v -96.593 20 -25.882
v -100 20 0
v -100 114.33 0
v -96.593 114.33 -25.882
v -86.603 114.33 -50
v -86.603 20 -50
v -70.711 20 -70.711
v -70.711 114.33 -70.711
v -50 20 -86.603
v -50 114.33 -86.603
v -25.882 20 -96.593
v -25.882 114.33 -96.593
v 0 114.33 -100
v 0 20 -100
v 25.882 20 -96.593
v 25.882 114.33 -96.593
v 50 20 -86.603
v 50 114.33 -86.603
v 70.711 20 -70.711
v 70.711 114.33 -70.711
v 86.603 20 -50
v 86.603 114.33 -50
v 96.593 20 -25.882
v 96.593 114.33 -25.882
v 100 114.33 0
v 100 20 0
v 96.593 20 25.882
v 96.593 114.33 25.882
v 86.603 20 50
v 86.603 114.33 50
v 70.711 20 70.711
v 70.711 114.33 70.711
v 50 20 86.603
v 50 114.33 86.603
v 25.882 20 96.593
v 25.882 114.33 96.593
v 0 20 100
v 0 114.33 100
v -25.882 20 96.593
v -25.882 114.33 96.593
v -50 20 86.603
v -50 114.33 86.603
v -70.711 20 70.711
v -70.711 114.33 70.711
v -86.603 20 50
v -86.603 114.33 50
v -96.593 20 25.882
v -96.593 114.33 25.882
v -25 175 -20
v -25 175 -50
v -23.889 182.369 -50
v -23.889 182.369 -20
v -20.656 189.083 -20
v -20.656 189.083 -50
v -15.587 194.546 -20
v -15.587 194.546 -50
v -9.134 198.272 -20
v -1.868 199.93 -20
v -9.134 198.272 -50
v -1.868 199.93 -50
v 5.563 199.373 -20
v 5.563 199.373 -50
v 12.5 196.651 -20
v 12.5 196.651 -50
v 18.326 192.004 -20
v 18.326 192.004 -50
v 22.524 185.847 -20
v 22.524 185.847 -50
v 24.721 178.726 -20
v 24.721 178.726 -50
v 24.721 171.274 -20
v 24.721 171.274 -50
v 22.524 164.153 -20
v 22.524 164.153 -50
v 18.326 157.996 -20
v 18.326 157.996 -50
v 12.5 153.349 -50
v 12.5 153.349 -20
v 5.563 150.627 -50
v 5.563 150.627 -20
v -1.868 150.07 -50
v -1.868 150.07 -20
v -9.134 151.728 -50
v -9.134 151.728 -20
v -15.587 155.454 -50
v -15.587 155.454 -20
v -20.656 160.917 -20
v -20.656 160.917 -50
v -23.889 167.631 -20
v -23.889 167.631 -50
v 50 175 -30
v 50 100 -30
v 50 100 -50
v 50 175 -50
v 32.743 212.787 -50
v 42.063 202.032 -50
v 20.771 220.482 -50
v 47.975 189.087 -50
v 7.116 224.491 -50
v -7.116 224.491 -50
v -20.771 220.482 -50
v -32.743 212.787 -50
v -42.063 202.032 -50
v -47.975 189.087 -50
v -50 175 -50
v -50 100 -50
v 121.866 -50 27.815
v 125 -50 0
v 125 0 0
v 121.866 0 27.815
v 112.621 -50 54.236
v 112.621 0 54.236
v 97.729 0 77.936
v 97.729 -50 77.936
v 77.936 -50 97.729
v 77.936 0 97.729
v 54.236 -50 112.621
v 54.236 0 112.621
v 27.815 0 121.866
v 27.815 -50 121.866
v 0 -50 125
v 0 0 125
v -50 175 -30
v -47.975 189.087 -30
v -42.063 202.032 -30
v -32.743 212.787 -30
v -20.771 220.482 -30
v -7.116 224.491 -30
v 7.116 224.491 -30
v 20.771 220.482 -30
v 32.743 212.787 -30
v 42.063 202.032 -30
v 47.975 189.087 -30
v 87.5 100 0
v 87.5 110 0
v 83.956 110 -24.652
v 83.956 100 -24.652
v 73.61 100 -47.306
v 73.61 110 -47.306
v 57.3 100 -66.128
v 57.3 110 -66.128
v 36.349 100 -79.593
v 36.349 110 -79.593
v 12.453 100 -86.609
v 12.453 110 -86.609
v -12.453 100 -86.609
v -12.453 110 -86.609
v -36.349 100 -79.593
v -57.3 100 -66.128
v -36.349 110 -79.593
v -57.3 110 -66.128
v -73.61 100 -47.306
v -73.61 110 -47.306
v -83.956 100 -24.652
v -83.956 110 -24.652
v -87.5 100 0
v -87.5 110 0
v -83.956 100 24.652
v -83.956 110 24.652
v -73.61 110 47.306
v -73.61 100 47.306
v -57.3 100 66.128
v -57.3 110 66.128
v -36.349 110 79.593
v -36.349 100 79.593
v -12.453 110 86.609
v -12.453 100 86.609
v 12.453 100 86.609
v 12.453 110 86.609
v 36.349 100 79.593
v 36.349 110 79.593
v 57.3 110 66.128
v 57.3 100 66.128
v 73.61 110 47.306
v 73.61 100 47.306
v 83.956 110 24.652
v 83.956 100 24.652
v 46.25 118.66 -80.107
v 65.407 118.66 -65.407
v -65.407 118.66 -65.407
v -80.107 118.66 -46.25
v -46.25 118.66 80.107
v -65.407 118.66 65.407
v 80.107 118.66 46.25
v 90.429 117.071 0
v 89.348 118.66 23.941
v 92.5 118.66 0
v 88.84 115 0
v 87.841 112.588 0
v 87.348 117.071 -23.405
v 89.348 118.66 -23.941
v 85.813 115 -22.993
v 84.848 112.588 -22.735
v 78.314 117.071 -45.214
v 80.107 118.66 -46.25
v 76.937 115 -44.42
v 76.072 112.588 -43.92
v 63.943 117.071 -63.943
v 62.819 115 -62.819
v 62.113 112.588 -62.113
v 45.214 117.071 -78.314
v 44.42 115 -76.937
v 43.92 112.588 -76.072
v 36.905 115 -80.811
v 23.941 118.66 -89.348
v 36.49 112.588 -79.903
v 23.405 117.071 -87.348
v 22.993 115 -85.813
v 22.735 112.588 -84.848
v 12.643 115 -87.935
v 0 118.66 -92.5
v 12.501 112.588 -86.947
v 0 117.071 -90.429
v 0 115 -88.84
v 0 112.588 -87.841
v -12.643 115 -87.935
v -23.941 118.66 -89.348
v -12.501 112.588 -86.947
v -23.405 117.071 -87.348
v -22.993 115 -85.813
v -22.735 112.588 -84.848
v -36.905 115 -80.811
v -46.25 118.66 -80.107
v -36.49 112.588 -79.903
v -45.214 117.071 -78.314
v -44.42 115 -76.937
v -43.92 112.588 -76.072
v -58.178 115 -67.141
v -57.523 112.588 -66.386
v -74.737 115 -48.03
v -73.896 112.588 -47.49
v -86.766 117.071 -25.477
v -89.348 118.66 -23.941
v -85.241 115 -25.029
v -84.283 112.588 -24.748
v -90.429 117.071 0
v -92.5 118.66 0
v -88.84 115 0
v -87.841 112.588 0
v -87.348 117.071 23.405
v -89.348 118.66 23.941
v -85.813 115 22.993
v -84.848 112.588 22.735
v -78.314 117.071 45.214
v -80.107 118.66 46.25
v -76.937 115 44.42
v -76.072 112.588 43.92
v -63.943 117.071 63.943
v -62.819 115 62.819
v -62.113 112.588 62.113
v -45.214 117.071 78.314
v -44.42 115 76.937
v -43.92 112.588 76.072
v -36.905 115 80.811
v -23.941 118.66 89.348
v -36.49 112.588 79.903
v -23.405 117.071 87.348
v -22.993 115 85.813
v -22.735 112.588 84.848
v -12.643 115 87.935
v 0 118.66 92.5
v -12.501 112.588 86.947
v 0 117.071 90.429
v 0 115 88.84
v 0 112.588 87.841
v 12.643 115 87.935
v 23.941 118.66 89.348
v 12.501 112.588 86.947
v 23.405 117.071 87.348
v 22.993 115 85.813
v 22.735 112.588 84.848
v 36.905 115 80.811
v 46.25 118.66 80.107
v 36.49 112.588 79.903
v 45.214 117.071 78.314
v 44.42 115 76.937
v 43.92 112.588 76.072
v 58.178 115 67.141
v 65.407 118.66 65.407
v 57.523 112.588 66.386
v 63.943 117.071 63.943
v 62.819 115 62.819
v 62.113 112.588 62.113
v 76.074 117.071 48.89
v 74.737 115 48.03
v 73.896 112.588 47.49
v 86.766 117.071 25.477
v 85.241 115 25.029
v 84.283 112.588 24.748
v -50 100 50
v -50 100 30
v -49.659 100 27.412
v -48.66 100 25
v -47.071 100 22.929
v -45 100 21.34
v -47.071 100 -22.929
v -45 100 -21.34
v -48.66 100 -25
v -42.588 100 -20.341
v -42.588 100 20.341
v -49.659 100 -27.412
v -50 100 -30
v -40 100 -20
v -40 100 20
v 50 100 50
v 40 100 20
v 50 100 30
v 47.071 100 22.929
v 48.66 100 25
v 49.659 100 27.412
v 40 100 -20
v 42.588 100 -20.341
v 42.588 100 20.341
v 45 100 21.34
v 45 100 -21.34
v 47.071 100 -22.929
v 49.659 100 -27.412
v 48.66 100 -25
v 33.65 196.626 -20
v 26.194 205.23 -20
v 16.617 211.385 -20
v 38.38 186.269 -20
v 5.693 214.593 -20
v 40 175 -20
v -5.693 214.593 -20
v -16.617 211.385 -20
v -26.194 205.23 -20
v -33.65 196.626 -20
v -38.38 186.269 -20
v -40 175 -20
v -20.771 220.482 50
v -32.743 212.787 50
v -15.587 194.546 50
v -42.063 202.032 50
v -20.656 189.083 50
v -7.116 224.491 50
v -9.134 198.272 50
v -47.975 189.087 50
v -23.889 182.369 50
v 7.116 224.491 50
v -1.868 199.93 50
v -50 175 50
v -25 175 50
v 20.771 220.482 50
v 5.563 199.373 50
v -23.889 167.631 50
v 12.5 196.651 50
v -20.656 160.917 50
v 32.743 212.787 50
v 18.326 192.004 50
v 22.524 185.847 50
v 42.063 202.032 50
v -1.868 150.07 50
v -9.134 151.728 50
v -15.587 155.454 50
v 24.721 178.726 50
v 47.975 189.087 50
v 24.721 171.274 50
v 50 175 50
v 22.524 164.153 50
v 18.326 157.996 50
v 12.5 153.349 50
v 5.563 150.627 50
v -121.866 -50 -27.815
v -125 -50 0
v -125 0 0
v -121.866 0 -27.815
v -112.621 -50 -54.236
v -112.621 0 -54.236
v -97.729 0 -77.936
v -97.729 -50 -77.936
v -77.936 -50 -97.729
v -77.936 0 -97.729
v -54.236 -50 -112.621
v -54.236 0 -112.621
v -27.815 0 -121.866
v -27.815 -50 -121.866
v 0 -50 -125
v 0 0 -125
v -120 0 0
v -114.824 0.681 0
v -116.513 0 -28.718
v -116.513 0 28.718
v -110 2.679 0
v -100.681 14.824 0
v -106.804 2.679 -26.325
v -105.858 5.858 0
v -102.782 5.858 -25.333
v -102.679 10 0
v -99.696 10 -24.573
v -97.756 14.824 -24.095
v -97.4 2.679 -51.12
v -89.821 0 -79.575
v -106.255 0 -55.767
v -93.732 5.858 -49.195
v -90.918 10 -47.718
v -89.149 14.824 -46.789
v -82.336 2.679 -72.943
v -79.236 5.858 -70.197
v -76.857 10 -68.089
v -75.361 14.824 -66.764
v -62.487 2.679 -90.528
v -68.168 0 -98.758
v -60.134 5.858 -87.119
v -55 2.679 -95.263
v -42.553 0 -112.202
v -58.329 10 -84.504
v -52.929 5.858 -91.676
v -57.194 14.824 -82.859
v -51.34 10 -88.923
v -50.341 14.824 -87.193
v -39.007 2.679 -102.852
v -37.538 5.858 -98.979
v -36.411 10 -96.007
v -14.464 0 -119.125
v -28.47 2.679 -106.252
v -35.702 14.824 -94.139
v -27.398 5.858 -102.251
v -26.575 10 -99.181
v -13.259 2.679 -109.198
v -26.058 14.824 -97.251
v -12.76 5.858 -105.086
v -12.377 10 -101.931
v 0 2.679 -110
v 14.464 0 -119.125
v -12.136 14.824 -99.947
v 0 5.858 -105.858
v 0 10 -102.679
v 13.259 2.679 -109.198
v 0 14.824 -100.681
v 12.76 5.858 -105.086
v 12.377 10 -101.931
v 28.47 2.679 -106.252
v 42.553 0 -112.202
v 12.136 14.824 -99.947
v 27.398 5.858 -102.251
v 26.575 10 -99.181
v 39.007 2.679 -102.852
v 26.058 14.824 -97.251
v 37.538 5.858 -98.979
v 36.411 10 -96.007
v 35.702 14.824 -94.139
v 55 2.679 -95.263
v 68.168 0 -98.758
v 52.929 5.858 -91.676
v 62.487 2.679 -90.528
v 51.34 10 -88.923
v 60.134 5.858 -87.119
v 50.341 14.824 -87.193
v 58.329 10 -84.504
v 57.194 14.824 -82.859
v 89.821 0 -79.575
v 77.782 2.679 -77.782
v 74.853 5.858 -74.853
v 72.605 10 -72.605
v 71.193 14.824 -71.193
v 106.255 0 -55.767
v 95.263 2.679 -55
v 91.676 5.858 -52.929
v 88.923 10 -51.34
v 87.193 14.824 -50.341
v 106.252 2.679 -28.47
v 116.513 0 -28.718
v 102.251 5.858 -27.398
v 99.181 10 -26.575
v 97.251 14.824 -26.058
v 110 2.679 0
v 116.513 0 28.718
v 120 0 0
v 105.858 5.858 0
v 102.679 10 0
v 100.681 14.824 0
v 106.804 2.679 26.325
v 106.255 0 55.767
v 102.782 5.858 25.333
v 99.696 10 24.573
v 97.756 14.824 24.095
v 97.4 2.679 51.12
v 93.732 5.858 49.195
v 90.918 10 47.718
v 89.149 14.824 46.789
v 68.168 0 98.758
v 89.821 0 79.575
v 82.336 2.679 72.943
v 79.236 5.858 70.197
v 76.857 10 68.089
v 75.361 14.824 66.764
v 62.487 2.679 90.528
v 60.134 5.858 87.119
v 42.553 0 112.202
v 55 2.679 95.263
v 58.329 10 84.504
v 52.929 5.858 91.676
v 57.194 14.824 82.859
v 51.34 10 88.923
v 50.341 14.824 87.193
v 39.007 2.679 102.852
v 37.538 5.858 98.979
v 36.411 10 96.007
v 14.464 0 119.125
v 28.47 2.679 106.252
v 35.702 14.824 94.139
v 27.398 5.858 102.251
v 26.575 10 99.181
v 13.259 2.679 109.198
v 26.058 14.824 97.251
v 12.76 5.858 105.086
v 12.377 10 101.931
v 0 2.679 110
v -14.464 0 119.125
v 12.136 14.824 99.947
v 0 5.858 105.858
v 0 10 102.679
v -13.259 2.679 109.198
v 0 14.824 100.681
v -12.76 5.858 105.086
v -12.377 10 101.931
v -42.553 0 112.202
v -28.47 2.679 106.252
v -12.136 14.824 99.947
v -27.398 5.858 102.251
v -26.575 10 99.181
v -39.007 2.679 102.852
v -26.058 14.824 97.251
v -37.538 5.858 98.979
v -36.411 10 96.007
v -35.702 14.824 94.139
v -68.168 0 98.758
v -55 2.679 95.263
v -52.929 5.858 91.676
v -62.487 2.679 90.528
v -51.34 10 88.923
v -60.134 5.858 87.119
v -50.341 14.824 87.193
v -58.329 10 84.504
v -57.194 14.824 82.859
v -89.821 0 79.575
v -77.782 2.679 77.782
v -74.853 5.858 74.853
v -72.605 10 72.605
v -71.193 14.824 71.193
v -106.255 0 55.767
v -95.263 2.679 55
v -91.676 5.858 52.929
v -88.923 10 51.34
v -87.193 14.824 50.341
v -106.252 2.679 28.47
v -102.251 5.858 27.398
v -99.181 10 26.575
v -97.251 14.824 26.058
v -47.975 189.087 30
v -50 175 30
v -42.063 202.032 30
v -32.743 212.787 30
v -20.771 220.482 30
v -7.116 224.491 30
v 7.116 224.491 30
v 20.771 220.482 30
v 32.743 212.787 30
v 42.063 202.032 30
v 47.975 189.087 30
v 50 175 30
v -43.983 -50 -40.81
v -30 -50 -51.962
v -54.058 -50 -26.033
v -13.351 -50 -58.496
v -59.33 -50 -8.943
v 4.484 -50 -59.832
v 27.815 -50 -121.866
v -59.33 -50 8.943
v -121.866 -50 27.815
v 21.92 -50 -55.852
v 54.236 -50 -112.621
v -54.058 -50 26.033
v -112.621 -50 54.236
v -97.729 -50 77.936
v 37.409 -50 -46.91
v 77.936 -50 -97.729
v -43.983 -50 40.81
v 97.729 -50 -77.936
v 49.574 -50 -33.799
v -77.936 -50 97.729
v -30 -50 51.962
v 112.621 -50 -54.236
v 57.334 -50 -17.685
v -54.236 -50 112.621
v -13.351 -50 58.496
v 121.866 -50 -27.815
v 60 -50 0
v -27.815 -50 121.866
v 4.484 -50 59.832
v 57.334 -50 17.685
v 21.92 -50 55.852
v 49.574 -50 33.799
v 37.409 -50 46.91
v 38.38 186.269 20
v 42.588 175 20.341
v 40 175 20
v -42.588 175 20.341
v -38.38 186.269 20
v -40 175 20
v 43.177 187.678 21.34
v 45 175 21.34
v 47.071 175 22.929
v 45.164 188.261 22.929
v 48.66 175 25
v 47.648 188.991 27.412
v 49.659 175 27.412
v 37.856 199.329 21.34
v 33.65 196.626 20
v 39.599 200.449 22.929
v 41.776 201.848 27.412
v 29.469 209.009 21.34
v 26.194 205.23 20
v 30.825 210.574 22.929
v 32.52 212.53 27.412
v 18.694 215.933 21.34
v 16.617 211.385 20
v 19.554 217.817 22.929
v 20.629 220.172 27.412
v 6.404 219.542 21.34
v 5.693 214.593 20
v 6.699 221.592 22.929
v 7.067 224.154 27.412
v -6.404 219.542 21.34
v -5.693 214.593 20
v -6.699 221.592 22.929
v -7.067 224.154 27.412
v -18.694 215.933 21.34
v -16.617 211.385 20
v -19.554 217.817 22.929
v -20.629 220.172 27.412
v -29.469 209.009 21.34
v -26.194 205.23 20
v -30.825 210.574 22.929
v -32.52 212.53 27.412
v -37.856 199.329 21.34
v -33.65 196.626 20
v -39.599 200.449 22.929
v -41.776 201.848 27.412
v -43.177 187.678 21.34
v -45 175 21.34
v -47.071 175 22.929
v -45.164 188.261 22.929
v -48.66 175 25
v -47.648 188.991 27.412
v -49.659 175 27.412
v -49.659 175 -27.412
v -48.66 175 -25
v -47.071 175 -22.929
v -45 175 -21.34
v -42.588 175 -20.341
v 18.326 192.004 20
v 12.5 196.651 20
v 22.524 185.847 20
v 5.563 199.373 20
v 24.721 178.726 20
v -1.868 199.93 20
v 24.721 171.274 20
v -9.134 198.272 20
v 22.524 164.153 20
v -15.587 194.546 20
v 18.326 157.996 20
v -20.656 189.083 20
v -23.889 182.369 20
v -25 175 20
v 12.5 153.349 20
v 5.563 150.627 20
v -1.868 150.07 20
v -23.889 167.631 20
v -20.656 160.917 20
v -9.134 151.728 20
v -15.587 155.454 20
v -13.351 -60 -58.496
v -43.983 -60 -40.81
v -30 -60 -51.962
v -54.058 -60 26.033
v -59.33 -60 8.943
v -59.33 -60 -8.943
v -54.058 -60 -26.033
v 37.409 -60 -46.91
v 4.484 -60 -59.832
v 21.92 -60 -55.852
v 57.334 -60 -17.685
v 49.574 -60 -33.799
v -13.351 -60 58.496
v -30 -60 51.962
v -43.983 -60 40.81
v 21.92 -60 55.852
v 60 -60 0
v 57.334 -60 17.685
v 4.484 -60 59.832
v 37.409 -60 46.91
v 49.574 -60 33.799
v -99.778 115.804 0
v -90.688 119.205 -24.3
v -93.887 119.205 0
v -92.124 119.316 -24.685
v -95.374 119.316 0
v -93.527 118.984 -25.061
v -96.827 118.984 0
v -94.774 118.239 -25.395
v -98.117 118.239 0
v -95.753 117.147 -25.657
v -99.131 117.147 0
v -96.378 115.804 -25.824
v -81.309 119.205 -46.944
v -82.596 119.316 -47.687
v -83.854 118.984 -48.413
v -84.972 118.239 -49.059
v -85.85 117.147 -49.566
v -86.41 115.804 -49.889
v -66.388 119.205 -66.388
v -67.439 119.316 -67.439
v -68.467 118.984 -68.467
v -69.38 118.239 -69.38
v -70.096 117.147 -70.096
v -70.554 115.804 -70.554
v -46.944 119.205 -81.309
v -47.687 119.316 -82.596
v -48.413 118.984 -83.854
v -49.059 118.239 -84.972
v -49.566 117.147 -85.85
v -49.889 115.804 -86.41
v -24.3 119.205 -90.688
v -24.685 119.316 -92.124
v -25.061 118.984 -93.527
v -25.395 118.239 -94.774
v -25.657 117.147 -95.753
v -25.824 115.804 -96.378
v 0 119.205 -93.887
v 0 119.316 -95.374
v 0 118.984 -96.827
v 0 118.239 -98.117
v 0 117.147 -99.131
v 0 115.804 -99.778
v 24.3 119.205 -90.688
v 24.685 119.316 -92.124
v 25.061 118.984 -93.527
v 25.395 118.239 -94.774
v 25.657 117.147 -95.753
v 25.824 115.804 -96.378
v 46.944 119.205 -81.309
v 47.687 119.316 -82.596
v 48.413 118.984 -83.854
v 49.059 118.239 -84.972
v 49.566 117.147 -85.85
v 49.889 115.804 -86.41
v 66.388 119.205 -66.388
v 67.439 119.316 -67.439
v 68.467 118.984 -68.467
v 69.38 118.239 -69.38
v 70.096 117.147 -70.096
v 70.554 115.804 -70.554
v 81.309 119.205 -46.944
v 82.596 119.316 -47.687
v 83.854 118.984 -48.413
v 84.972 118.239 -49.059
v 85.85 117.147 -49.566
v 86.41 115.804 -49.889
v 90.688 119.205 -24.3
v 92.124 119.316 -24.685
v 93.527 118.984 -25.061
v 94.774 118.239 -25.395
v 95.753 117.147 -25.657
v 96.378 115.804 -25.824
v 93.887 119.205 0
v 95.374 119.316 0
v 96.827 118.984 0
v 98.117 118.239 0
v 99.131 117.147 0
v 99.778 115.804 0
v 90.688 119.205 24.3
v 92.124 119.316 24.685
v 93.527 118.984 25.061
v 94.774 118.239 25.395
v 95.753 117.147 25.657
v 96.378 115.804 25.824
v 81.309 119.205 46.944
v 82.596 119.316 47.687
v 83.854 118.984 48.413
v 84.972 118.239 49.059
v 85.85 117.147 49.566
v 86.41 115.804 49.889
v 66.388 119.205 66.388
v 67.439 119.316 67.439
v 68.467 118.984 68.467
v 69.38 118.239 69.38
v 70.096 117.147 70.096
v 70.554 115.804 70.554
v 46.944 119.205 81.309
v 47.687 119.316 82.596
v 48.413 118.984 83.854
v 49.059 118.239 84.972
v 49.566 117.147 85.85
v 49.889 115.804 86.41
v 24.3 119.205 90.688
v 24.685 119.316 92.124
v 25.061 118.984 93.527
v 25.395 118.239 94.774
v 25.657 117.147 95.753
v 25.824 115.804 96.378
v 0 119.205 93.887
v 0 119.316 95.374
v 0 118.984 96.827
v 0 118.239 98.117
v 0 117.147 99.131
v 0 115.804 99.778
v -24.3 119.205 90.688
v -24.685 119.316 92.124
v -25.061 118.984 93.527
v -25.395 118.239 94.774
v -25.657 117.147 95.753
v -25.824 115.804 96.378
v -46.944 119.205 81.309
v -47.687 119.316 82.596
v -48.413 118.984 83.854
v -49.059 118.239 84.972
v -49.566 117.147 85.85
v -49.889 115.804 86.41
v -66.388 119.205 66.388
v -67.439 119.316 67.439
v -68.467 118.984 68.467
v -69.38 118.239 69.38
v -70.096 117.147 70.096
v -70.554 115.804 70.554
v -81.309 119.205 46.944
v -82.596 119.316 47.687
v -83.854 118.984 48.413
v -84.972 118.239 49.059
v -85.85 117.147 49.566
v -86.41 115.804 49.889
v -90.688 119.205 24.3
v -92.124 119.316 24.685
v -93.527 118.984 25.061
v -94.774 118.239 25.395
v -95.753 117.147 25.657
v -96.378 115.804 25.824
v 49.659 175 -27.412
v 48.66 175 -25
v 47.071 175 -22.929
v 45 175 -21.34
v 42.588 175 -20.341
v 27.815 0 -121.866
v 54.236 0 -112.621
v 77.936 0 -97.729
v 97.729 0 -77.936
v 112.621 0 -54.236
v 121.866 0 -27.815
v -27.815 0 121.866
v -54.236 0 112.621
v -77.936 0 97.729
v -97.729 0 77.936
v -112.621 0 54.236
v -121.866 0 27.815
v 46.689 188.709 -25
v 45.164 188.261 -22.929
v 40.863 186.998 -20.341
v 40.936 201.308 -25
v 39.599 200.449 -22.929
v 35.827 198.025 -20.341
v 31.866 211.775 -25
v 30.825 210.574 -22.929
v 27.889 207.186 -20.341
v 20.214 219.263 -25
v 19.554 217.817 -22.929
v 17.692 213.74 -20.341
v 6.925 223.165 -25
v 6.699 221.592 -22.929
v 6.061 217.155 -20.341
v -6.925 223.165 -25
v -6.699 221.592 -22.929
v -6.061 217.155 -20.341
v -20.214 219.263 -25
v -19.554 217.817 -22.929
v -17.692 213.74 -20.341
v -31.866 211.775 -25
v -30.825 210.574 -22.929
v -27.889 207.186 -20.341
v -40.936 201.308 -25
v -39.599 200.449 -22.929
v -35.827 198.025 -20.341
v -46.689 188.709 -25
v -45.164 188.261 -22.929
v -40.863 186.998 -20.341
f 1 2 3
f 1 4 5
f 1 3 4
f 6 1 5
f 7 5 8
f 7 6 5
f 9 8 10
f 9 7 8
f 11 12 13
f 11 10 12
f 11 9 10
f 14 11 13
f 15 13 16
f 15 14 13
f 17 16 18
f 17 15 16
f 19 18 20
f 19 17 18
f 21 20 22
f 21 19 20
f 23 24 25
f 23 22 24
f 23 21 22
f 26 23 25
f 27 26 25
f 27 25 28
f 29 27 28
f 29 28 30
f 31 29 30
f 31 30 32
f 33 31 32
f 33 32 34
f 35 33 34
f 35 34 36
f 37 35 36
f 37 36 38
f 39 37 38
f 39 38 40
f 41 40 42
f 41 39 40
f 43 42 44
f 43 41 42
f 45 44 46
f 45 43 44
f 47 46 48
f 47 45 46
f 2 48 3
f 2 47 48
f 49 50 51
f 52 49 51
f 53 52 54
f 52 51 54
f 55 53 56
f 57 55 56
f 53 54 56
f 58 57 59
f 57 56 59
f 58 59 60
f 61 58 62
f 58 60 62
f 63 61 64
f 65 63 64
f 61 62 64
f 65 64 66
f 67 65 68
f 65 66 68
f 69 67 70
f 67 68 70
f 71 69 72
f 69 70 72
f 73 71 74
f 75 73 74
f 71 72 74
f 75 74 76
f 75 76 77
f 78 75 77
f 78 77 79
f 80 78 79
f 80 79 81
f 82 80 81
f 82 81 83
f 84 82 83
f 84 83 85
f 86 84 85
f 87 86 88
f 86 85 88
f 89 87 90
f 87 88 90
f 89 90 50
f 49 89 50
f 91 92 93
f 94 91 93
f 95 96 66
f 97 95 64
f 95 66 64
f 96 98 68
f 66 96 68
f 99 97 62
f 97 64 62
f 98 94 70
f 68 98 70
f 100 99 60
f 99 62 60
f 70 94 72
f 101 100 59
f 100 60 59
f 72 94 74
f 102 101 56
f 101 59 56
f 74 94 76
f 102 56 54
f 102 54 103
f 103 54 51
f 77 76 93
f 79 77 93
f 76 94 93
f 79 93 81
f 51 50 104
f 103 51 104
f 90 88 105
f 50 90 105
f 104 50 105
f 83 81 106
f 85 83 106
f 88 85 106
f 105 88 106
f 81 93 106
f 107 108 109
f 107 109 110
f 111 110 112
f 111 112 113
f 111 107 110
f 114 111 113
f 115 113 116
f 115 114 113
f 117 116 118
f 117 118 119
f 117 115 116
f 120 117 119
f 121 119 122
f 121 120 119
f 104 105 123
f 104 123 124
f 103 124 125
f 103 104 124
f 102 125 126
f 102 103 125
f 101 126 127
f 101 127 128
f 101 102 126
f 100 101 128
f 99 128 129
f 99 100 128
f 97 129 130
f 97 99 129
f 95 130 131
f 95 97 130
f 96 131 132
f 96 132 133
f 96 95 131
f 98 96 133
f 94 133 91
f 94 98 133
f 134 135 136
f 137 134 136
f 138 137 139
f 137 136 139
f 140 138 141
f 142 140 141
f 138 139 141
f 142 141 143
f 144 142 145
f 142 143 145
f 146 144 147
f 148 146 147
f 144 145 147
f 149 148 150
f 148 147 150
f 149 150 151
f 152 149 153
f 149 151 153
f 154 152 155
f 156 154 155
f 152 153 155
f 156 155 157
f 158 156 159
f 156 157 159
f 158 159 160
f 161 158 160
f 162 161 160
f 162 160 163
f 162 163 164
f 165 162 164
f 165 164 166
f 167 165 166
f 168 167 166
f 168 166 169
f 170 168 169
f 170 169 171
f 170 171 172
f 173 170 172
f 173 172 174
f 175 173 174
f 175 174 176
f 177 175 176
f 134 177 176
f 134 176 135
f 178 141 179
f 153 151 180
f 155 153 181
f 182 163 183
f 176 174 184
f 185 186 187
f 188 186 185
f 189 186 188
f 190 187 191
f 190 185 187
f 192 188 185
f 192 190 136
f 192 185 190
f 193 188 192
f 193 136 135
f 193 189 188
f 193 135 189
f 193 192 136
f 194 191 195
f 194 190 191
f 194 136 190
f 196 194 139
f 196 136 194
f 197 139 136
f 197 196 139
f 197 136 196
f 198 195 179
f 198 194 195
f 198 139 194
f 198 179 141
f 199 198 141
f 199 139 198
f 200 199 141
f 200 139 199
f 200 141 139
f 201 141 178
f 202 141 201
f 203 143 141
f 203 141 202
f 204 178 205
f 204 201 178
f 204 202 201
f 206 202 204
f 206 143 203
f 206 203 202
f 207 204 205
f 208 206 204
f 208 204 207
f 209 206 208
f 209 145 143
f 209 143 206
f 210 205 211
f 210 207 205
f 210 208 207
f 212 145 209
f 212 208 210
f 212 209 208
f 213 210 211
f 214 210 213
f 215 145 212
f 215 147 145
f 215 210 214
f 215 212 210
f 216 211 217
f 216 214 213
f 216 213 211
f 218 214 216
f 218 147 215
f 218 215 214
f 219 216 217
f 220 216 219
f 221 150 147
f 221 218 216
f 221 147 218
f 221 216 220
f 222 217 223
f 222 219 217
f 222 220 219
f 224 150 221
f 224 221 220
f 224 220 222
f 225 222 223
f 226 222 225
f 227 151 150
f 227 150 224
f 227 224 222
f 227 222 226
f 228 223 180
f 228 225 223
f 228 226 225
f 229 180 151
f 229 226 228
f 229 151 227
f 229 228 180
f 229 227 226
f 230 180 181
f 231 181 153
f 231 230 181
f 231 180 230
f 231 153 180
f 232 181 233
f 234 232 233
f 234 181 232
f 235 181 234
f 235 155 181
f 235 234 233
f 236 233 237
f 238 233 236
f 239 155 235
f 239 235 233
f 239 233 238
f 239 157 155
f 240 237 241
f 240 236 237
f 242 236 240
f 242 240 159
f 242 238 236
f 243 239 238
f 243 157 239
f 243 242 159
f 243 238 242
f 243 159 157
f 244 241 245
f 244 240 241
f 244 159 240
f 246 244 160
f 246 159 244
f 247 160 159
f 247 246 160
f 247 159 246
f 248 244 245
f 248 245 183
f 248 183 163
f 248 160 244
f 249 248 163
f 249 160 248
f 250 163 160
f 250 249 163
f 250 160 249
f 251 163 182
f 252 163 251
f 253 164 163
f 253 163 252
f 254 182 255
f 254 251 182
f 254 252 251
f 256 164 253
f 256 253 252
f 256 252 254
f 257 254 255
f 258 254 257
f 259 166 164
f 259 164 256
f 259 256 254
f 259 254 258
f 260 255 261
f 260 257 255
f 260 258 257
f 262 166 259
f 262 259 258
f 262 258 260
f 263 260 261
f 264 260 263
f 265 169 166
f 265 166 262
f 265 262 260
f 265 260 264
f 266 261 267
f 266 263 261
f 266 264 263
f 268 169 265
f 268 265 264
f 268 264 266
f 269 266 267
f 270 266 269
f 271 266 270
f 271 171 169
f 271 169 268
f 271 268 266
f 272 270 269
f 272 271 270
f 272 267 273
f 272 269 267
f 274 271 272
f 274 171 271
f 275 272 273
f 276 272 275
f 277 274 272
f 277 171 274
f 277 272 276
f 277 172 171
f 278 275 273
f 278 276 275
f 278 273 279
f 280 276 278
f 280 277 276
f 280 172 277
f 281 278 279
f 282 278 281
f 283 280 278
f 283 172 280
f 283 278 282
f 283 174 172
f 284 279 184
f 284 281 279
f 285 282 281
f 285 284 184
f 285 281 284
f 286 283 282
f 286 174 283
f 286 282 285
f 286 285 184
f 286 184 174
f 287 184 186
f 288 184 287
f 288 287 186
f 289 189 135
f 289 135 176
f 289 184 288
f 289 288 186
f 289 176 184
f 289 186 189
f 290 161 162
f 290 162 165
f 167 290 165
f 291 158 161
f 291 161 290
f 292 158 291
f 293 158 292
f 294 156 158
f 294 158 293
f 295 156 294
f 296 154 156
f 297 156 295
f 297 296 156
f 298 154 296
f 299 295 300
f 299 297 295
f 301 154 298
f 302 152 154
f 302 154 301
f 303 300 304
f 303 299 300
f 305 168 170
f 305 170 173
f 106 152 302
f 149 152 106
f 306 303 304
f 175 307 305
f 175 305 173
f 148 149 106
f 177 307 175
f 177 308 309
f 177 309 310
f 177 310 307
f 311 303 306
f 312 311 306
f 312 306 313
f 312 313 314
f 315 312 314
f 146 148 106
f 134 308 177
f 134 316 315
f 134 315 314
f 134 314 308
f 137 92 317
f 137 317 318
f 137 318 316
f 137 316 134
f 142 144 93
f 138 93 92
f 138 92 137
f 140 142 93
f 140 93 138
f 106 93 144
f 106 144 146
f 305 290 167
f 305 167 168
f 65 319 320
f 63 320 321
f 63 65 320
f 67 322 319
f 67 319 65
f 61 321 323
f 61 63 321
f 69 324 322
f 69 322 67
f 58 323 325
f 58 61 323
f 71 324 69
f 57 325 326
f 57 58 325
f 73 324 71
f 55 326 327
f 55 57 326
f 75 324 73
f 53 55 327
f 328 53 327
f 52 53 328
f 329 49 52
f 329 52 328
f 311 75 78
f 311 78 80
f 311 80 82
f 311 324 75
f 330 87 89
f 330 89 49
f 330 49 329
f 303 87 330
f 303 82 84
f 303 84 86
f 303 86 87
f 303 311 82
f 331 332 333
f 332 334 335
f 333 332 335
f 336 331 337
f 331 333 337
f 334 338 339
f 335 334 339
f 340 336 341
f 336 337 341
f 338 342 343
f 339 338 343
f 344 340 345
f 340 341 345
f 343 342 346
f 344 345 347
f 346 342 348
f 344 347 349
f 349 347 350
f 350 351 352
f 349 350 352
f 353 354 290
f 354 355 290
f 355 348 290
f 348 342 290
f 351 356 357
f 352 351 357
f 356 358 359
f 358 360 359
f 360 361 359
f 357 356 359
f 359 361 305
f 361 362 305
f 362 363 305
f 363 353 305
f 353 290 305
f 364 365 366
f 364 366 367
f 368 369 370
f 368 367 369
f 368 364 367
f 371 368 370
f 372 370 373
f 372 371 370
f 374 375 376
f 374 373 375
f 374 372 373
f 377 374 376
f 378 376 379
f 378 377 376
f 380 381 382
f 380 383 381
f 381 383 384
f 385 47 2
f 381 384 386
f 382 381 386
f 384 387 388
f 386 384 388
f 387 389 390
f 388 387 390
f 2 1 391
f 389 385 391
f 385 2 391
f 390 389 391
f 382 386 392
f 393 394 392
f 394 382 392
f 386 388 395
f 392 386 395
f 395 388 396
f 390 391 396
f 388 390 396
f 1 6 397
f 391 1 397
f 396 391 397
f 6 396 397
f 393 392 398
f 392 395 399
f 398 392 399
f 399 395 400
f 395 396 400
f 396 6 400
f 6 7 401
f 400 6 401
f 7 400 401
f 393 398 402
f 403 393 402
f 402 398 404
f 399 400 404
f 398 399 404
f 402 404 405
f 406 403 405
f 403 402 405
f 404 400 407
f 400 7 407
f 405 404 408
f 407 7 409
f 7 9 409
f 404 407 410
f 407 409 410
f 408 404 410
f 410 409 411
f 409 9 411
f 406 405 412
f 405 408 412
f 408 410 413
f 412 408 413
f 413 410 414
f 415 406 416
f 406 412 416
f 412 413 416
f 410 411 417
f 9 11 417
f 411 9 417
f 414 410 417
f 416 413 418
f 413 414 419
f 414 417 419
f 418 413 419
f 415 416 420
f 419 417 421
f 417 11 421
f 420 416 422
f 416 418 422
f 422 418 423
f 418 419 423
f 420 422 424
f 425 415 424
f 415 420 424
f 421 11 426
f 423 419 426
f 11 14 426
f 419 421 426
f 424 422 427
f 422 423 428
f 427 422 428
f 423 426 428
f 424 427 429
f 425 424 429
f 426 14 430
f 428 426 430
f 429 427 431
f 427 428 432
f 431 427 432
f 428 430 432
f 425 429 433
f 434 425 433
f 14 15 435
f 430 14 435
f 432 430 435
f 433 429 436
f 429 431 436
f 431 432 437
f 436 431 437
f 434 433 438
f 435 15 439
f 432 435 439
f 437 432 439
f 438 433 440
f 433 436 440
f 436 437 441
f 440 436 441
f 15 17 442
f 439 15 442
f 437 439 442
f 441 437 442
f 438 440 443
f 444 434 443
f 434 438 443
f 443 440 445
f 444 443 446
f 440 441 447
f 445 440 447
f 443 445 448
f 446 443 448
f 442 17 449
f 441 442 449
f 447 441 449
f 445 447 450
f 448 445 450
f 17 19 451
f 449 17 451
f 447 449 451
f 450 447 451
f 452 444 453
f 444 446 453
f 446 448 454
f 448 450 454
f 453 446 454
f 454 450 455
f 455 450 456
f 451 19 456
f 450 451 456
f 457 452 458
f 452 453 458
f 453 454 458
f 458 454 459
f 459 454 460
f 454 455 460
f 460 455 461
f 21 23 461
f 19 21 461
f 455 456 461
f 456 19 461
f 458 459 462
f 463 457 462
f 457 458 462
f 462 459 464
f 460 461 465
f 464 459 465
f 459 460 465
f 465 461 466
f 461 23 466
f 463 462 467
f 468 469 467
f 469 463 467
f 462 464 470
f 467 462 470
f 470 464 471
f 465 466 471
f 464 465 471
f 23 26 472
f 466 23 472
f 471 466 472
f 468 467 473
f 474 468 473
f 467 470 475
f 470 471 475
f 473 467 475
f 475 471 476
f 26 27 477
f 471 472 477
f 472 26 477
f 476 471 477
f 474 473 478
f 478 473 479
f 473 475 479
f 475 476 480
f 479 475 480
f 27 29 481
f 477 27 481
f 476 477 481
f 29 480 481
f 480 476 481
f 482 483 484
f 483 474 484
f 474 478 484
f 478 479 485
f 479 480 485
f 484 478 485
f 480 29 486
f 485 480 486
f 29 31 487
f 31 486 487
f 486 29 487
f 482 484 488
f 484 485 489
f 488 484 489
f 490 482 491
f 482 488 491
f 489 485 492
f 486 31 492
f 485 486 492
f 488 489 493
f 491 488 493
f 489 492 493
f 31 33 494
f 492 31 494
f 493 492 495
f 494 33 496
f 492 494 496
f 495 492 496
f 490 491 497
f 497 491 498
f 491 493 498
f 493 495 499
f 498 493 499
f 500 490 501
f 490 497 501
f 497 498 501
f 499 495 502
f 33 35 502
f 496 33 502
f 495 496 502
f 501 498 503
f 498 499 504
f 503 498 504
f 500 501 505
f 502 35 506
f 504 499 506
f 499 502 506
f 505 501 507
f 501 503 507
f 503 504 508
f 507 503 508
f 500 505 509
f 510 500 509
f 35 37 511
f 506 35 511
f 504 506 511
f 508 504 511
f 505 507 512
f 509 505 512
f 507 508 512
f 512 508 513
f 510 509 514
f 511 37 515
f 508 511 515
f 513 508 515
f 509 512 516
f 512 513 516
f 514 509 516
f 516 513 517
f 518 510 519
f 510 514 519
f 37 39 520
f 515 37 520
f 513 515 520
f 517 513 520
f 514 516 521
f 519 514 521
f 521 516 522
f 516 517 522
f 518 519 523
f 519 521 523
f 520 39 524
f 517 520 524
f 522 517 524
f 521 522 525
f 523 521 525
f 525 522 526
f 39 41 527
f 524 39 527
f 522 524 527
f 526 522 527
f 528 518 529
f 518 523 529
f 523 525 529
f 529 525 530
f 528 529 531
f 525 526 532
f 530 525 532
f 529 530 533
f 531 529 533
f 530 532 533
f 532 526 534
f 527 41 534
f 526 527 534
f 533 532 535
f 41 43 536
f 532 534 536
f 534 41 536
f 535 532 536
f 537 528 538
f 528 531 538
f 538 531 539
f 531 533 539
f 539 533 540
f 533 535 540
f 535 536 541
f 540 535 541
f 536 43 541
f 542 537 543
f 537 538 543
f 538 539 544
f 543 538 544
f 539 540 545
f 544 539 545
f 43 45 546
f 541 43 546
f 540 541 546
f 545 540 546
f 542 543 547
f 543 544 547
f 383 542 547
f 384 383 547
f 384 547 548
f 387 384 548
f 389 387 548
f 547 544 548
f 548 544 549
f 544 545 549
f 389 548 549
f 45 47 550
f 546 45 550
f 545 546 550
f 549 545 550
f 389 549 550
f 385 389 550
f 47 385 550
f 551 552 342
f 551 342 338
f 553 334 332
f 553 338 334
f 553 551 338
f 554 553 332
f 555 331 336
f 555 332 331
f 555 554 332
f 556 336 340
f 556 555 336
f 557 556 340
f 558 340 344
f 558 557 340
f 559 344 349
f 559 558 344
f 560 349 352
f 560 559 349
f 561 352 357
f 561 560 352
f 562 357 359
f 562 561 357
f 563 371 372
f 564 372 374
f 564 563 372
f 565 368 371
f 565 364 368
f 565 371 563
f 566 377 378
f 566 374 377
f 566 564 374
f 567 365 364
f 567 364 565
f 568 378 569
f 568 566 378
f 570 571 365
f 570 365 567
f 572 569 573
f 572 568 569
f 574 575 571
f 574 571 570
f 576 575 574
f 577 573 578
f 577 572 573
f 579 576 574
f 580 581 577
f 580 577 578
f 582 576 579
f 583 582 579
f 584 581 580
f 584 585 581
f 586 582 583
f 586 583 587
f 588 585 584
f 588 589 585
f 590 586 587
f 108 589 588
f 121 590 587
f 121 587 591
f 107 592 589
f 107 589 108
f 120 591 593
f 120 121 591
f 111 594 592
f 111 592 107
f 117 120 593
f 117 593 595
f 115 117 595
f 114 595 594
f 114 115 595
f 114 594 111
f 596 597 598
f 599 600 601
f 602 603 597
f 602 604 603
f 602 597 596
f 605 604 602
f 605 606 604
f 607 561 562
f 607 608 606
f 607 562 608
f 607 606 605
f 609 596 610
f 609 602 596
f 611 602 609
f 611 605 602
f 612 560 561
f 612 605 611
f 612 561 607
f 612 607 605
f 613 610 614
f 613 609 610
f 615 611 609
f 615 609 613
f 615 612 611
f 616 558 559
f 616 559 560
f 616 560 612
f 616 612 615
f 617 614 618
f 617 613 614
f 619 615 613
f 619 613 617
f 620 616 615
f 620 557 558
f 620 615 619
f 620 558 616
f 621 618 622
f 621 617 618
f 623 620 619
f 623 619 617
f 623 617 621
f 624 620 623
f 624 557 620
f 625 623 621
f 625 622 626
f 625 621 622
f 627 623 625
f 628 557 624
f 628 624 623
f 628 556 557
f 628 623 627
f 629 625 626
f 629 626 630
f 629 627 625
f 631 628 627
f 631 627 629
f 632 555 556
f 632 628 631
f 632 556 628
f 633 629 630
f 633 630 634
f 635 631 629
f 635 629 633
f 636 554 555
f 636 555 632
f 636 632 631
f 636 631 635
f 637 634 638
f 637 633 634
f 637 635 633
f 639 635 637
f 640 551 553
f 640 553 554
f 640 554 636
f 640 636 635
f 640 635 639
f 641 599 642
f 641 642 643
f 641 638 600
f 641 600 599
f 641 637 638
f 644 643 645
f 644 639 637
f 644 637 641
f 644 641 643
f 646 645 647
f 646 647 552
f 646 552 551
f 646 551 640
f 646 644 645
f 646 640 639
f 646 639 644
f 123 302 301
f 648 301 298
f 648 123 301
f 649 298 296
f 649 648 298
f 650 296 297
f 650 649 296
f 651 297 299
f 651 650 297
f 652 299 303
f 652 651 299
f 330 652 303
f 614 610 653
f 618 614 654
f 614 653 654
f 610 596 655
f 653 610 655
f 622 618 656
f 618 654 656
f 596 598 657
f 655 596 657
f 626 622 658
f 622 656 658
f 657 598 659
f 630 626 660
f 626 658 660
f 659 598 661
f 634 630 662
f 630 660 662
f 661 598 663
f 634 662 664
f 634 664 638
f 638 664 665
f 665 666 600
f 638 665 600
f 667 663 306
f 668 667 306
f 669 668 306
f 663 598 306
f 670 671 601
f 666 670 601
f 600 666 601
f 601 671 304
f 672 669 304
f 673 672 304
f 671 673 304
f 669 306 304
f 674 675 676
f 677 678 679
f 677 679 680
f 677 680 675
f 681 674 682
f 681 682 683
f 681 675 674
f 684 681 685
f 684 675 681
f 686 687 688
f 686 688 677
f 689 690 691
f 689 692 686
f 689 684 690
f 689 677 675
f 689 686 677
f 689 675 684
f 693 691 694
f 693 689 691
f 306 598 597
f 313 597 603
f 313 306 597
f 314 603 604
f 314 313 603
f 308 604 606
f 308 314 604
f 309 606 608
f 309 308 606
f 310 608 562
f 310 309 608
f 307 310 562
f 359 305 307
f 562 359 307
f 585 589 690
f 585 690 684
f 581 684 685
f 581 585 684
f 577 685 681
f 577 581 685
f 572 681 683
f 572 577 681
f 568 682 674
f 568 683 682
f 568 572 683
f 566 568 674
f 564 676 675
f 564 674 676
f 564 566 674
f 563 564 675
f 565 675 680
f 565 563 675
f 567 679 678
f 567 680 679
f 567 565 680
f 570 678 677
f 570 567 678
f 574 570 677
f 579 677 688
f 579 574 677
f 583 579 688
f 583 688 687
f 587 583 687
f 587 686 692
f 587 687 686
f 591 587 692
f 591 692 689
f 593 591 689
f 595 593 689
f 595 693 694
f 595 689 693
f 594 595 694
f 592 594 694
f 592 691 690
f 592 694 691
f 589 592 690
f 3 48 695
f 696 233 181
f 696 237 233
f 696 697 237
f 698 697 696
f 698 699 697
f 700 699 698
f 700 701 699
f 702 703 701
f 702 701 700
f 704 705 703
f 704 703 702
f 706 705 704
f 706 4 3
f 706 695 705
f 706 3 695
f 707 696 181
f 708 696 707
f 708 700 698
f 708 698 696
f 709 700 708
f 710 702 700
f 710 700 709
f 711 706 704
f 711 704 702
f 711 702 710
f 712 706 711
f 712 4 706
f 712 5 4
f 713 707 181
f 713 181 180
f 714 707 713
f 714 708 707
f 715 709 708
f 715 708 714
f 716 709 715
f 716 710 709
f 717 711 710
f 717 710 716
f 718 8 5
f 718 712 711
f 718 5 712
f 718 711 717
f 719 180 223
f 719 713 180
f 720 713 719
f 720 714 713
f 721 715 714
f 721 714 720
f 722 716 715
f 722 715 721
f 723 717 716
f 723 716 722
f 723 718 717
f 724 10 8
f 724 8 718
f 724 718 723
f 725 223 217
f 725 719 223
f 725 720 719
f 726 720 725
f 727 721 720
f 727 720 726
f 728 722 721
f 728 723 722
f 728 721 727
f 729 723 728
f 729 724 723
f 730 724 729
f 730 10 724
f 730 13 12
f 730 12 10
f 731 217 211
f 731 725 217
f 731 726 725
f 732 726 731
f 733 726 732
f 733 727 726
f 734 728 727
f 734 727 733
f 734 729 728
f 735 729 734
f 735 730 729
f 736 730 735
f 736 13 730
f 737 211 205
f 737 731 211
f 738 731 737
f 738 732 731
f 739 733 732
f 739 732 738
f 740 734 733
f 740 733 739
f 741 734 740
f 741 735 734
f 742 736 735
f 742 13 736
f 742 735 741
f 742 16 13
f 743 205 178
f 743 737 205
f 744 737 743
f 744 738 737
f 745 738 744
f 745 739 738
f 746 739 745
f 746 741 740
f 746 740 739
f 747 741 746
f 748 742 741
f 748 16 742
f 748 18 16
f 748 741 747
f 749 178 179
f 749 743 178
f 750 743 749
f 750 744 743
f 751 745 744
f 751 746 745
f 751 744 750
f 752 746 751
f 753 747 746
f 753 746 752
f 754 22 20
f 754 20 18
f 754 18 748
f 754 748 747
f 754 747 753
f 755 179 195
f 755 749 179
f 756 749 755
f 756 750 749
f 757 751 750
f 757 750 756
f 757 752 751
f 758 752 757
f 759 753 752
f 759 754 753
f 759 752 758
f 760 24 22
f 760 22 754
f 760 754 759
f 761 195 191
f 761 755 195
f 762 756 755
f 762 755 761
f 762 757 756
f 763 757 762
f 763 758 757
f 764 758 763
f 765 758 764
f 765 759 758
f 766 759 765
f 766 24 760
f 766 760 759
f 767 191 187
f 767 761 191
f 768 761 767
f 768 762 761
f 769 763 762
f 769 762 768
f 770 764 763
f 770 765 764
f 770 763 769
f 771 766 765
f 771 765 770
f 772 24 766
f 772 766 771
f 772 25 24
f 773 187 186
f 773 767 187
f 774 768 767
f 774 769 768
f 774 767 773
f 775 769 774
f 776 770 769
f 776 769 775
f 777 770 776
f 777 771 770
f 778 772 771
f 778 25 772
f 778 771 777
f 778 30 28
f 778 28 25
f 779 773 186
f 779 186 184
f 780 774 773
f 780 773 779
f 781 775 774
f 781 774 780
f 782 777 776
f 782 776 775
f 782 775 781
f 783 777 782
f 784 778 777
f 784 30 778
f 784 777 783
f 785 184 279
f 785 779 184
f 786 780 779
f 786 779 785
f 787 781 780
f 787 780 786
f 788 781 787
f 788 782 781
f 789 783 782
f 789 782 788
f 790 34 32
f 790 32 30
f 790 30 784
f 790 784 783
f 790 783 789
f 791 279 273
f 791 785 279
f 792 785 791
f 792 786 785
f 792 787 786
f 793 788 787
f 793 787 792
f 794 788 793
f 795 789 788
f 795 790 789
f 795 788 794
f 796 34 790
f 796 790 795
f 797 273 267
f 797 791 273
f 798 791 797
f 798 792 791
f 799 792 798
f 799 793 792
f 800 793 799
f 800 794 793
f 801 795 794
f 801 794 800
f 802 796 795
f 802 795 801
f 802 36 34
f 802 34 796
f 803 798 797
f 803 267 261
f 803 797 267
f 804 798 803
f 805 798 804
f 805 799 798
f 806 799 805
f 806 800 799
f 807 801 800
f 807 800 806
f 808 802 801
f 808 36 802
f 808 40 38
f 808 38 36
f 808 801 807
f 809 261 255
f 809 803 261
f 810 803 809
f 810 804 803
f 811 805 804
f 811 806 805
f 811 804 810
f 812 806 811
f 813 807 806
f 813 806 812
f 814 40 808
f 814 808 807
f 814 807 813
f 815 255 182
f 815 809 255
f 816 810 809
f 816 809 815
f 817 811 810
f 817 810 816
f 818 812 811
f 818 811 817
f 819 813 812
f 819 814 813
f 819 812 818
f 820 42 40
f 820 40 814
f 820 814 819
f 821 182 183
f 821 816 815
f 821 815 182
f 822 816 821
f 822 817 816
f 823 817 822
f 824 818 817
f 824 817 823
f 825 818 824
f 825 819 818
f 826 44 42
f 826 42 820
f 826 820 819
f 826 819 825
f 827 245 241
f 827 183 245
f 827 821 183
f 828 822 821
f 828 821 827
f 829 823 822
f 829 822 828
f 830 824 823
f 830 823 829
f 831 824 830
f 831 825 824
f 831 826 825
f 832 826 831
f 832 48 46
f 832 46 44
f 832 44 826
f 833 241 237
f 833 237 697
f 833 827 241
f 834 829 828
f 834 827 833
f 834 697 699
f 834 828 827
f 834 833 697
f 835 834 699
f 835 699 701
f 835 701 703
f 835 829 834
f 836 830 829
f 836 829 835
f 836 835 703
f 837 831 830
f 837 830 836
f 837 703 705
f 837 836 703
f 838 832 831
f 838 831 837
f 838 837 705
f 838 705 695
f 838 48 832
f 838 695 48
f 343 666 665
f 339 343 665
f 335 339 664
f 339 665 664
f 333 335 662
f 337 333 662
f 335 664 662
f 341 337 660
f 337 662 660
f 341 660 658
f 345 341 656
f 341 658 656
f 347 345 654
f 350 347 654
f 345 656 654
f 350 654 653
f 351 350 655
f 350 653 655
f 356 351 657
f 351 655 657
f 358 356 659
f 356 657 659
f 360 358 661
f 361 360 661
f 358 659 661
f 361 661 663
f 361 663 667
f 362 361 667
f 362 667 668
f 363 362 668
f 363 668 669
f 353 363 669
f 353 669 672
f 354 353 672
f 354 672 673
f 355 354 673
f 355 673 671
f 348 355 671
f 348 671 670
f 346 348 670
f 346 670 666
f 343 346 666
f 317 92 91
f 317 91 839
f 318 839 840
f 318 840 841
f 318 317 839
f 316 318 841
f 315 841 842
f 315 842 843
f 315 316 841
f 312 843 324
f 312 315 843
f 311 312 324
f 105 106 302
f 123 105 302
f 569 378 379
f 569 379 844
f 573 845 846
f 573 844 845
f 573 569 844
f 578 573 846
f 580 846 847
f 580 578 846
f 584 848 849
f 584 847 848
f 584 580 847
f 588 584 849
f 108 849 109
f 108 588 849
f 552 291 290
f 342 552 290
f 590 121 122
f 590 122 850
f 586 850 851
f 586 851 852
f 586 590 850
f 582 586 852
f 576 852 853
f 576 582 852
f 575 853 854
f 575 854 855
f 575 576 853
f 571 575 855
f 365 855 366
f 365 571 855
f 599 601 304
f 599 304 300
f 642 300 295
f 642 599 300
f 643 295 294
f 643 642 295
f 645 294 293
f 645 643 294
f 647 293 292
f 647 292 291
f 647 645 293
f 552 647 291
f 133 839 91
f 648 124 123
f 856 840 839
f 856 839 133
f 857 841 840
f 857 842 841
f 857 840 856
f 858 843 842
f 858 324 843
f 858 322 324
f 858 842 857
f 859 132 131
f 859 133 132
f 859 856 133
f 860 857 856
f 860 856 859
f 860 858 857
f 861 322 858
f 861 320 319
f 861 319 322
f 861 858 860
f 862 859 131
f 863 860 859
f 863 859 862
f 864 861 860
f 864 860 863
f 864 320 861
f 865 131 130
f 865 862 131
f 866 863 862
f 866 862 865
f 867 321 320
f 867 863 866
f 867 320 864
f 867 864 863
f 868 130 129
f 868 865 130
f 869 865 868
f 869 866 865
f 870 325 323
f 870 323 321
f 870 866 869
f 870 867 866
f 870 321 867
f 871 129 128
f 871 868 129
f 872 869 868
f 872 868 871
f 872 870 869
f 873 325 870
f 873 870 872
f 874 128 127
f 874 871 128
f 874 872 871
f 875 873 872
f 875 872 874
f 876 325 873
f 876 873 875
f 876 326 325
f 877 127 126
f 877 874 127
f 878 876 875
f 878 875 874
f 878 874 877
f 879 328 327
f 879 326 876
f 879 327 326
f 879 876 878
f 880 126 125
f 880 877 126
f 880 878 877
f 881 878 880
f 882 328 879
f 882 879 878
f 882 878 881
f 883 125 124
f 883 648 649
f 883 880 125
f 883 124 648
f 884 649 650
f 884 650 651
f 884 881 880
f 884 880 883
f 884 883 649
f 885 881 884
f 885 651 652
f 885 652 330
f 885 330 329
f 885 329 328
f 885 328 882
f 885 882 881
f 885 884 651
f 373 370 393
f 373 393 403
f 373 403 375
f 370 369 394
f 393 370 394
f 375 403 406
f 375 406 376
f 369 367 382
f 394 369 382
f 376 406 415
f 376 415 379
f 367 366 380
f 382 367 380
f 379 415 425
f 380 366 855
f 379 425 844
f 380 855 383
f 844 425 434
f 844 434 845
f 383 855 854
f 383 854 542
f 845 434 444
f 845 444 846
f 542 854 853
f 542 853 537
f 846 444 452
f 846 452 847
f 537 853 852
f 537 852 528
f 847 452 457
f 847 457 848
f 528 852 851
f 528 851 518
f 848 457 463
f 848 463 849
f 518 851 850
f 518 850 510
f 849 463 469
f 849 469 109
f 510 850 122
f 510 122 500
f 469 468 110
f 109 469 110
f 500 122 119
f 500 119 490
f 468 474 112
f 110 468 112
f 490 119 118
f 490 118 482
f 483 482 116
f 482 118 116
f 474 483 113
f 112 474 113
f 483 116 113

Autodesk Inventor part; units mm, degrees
ref_plane "YZ Plane" through (0, 0, 0) normal (1, 0, 0) x (0, 1, 0)
ref_plane "XZ Plane" through (0, 0, 0) normal (0, 1, 0) x (-1, 0, 0)
ref_plane "XY Plane" through (0, 0, 0) normal (0, 0, 1) x (1, 0, 0)
sketch "Sketch1" plane through (0, 0, 0) normal (0, 1, 0) x (-1, 0, 0)
  circle A0 centre (0, 0) radius 100
  dimension "d0" = 200
extrude "Extrusion1" add sketch "Sketch1" along normal blind 120
sketch "Sketch2" plane through (0, 0, 0) normal (0, -1, 0) x (1, 0, 0)
  line L0 (125, 125) -> (-125, 125)
  line L1 (-125, 125) -> (-125, -125)
  line L2 (-125, -125) -> (125, -125)
  line L3 (125, -125) -> (125, 125)
  line L4 (125, 125) -> (-125, -125) construction
  line L5 (-125, 125) -> (125, -125) construction
  point P0 (0, 0)
  dimension "d3" = 250
  dimension "d4" = 250
extrude "Extrusion2" add sketch "Sketch2" along normal blind 50
fillet "Fillet1" radius 20 1 edges at (100, 0, 0)
sketch "Sketch3" plane through (0, 120, 0) normal (0, 1, 0) x (1, 0, 0)
  circle A0 centre (0, 0) radius 87.5
  dimension "d8" = 175
extrude "Extrusion3" cut sketch "Sketch3" against normal blind 20
fillet "Fillet2" radius 10 1 edges at (-87.5, 120, 0)
sketch "Sketch4" plane through (0, 100, 0) normal (0, 1, 0) x (1, 0, 0)
  line L0 (-50, -50) -> (50, -50)
  line L1 (50, -50) -> (50, 50)
  line L2 (50, 50) -> (-50, 50)
  line L3 (-50, 50) -> (-50, -50)
  line L4 (-50, -50) -> (50, 50) construction
  line L5 (50, -50) -> (-50, 50) construction
  line L6 (-50, -50) -> (50, -50)
  line L7 (50, -50) -> (50, -20)
  line L8 (50, -20) -> (-50, -20)
  line L9 (-50, -20) -> (-50, -50)
  line L10 (-50, 50) -> (50, 50)
  line L11 (50, 50) -> (50, 20)
  line L12 (50, 20) -> (-50, 20)
  line L13 (-50, 20) -> (-50, 50)
  point P0 (0, 0)
  dimension "d12" = 100
  dimension "d13" = 100
  dimension "d14" = 30
  dimension "d15" = 30
extrude "Extrusion4" add sketch "Sketch4" along normal blind 125 contours L3 L8 L1 L0 | L3 L2 L1 L12
sketch "Sketch5" plane through (50, 100, -50) normal (0, 0, -1) x (-1, 0, 0)
  circle A0 centre (50, 75) radius 50
  line L0 (0, 0) -> (0, 125) projected
  line L1 (0, 75) -> (0, 125)
  line L2 (0, 125) -> (100, 125)
  line L3 (100, 125) -> (100, 75)
  circle A1 centre (50, 75) radius 25
  point P0 (50, -100)
  point P1 (50, 125)
  dimension "d18" = 50
extrude "Extrusion5" cut sketch "Sketch5" against normal blind 125 contours L0 L2 A0 | A0 L2 L3 | A1
fillet "Fillet3" radius 10 3 edges at (-50, 137.5, -20) (0, 225, -20) (50, 137.5, -20)
fillet "Fillet4" radius 10 3 edges at (0, 225, 20) (50, 137.5, 20) (-50, 137.5, 20)
fillet "Fillet5" radius 5 1 edges at (100, 120, 0)
fillet "Fillet6" radius 125 4 edges at (125, -25, 125) (125, -25, -125) (-125, -25, 125) (-125, -25, -125)
sketch "Sketch6" plane through (0, -50, 0) normal (0, -1, 0) x (1, 0, 0)
  circle A0 centre (0, 0) radius 60
  dimension "d25" = 120
extrude "Extrusion6" add sketch "Sketch6" along normal blind 10
properties part number "HANDBASE1"
